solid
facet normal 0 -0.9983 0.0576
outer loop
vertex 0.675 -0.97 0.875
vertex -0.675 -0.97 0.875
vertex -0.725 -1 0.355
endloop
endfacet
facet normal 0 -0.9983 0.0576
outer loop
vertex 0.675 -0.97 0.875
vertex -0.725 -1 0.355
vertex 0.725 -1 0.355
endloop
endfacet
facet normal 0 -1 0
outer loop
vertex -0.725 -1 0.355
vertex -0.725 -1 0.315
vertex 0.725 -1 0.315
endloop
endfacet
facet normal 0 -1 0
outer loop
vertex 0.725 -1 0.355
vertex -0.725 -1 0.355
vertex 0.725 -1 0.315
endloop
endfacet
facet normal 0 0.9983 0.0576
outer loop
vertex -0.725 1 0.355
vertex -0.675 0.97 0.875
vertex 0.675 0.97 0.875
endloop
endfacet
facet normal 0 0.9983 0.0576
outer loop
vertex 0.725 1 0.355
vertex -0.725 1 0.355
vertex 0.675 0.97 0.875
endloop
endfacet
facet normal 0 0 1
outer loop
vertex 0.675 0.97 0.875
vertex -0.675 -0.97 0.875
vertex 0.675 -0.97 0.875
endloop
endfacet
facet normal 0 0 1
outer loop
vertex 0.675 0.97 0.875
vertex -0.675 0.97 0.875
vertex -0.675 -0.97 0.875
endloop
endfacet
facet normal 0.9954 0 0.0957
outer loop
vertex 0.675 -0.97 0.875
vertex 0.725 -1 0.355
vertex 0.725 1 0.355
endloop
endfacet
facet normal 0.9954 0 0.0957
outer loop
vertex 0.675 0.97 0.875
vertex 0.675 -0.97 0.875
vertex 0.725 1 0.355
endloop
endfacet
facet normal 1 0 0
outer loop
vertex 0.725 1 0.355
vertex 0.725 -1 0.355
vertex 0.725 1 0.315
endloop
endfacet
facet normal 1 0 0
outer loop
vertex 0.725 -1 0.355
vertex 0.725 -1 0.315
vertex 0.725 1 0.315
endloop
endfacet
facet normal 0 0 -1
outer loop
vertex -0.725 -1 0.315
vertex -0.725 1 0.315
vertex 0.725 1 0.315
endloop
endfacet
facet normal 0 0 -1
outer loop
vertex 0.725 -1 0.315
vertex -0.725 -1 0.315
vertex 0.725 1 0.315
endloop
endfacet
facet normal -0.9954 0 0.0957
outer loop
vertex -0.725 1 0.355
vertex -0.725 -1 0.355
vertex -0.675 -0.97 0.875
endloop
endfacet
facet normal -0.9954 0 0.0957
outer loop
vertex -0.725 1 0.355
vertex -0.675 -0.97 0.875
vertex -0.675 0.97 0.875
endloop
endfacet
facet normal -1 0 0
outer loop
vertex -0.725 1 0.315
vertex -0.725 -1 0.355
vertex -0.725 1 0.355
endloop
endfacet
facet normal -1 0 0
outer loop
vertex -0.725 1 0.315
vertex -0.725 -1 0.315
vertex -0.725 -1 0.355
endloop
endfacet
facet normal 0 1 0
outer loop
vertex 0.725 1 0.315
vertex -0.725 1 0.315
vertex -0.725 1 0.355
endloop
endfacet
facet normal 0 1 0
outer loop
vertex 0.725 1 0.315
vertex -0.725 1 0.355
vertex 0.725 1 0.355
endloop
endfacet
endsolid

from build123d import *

# Parameters (mm, degrees)
SKETCH009_W      = 1.45
SKETCH009_H      = 2
EXTRUDE008_DEPTH = 0.56
CHAMFER_1_SIZE2  = 0.03
CHAMFER_1_SIZE   = 0.52
CHAMFER_2_SIZE2  = 0.03
CHAMFER_2_SIZE   = 0.52
CHAMFER001_SIZE2 = 0.52
CHAMFER001_SIZE  = 0.05
CHAMFER002_SIZE2 = 0.52
CHAMFER002_SIZE  = 0.05


with BuildPart() as part:
    # Sketch009 (on Face32 of Extrude003) → Extrude008 (new body)
    with BuildSketch(Plane.XY.offset(0.315)):
        Rectangle(SKETCH009_W, SKETCH009_H)
    extrude(amount=EXTRUDE008_DEPTH)

    # Chamfer 1
    chamfer_1_edges = [part.edges().sort_by_distance(p)[0] for p in [
        (0, 1, 0.875),
    ]]
    chamfer_1_side = part.faces().sort_by_distance((0, 1, 0.595))[0]
    chamfer(chamfer_1_edges, length=CHAMFER_1_SIZE, length2=CHAMFER_1_SIZE2, reference=chamfer_1_side)

    # Chamfer 2
    chamfer_2_edges = [part.edges().sort_by_distance(p)[0] for p in [
        (0, -1, 0.875),
    ]]
    chamfer_2_side = part.faces().sort_by_distance((0, -1, 0.595))[0]
    chamfer(chamfer_2_edges, length=CHAMFER_2_SIZE, length2=CHAMFER_2_SIZE2, reference=chamfer_2_side)

    # Chamfer001
    chamfer001_edges = [part.edges().sort_by_distance(p)[0] for p in [
        (0.725, 0, 0.875),
    ]]
    chamfer001_side = part.faces().sort_by_distance((0, 0, 0.875))[0]
    chamfer(chamfer001_edges, length=CHAMFER001_SIZE, length2=CHAMFER001_SIZE2, reference=chamfer001_side)

    # Chamfer002
    chamfer002_edges = [part.edges().sort_by_distance(p)[0] for p in [
        (-0.725, 0, 0.875),
    ]]
    chamfer002_side = part.faces().sort_by_distance((-0.025, 0, 0.875))[0]
    chamfer(chamfer002_edges, length=CHAMFER002_SIZE, length2=CHAMFER002_SIZE2, reference=chamfer002_side)


solid = part.part
